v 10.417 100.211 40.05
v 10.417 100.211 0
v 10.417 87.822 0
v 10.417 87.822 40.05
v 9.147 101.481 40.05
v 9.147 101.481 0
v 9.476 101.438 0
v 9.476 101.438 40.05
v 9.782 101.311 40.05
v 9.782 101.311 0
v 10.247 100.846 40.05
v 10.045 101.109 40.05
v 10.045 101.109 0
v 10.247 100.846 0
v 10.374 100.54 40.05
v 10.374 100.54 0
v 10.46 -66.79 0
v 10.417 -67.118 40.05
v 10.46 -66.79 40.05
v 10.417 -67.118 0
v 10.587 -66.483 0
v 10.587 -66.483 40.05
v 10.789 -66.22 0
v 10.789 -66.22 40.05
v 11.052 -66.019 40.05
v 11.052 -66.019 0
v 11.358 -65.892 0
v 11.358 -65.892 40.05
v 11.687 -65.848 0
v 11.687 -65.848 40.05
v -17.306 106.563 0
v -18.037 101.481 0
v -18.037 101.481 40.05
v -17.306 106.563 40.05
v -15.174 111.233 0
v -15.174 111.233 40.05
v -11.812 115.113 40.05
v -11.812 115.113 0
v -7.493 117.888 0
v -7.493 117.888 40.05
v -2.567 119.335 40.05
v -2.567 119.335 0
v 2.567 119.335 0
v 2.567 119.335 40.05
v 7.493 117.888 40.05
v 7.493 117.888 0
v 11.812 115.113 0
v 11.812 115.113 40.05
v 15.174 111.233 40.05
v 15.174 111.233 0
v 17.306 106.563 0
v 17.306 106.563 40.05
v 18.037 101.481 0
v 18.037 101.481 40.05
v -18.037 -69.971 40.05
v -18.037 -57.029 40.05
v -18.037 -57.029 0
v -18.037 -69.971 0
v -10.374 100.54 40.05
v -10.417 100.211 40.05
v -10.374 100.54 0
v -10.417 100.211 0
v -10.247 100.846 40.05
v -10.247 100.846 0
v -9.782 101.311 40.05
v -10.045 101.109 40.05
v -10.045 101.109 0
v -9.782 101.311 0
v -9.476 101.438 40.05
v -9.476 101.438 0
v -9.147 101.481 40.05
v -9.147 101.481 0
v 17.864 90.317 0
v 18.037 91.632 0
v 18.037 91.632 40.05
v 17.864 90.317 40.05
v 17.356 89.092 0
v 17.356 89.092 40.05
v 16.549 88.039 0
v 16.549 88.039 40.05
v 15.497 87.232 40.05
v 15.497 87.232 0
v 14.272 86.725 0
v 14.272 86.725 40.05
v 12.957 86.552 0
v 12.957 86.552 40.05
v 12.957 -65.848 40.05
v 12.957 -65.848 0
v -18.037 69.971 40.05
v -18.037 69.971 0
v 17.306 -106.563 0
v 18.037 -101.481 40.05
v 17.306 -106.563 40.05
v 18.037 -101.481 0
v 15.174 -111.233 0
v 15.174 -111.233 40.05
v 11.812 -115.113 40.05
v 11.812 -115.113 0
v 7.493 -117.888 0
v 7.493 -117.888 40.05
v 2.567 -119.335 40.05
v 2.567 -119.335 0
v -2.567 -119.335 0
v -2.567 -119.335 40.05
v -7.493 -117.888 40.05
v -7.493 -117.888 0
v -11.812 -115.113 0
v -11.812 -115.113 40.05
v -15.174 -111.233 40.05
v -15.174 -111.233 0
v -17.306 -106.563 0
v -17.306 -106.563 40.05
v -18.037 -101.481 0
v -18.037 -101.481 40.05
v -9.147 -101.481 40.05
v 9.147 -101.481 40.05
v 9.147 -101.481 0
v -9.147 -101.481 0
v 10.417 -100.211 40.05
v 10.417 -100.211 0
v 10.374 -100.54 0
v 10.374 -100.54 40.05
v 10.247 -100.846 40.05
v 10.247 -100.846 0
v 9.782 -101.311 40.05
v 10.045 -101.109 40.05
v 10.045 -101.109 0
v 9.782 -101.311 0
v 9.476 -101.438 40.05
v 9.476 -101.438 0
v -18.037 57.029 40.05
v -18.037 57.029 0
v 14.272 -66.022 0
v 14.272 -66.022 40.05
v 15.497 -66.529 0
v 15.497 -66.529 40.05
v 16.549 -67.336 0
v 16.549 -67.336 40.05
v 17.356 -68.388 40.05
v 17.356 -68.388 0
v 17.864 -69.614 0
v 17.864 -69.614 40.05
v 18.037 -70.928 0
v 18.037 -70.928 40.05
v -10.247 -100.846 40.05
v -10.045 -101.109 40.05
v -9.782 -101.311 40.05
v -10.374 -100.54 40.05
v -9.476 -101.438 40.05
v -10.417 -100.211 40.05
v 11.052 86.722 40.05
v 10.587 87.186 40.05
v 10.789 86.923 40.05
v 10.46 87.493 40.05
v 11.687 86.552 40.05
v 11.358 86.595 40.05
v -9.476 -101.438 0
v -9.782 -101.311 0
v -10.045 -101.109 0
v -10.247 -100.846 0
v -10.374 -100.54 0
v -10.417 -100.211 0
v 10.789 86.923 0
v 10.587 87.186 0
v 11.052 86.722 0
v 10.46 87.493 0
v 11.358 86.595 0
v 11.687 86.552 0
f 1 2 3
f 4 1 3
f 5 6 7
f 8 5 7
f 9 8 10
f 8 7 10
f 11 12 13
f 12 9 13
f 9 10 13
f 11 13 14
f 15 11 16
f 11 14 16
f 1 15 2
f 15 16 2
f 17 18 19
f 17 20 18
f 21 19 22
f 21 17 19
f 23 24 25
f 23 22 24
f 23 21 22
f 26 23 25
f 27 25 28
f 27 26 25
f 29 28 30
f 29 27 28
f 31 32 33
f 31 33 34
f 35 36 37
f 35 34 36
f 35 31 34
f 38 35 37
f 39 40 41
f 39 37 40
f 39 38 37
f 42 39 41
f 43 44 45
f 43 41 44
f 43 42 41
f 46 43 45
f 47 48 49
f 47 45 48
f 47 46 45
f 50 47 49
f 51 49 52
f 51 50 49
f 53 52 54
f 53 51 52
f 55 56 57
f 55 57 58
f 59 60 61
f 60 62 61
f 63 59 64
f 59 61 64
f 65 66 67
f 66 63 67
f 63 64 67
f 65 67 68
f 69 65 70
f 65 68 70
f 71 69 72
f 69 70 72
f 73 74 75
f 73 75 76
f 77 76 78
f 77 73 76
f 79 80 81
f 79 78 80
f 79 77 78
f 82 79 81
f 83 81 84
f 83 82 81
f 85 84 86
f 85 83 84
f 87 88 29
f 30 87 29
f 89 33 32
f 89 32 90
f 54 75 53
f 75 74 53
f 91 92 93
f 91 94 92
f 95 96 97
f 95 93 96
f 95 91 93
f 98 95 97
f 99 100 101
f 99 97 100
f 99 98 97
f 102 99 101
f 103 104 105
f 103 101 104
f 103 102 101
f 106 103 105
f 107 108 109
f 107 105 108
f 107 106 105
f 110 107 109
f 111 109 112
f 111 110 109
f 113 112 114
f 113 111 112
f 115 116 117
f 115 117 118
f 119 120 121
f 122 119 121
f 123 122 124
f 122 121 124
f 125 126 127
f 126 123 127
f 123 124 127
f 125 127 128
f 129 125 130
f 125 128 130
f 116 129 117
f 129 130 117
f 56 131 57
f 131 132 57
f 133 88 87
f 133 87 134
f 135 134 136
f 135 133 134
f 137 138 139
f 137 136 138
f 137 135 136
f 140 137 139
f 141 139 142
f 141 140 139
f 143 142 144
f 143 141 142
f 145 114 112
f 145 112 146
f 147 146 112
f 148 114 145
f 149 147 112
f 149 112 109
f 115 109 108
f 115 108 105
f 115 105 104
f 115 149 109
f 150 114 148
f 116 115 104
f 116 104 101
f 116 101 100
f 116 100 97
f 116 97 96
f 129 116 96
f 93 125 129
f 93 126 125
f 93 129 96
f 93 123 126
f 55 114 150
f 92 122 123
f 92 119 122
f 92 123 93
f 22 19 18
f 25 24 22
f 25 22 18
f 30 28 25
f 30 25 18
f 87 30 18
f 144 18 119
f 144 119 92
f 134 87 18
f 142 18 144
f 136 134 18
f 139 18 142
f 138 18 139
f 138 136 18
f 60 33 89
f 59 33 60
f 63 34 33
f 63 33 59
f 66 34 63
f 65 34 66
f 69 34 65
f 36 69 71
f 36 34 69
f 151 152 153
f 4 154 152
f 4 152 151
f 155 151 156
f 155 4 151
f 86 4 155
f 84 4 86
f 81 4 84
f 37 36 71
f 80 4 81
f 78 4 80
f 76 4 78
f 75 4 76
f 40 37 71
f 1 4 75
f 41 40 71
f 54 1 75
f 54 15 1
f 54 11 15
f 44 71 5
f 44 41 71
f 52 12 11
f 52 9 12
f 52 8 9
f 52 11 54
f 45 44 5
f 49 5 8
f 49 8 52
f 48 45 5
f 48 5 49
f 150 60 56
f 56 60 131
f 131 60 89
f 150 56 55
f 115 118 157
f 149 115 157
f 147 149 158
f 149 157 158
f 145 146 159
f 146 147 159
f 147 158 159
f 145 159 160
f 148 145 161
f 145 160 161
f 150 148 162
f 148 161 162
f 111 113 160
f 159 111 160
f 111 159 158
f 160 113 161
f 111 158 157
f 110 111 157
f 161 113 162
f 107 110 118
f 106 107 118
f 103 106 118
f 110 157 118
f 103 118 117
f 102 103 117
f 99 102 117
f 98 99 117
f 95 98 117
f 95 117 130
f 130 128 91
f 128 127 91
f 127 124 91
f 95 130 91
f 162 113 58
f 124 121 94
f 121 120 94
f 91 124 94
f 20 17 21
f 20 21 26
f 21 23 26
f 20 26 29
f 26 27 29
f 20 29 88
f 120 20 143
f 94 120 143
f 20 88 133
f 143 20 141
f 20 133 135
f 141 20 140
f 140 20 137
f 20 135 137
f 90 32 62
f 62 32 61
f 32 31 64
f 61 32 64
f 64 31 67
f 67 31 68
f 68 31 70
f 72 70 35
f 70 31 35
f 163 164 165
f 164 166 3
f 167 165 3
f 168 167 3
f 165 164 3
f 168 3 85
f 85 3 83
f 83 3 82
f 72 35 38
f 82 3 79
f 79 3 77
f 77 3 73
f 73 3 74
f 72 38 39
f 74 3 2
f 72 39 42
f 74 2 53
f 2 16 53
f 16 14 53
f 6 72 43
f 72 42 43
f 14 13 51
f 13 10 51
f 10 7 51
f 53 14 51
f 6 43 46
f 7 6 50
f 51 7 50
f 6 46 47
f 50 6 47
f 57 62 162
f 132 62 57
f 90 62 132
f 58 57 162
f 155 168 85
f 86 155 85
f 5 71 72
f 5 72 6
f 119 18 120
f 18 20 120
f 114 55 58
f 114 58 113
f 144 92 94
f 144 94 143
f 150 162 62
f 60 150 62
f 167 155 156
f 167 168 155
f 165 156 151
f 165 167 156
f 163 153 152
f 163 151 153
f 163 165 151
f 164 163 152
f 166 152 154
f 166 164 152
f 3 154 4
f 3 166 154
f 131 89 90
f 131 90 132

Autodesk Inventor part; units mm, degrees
ref_plane "YZ Plane" through (0, 0, 0) normal (1, 0, 0) x (0, 1, 0)
ref_plane "XZ Plane" through (0, 0, 0) normal (0, 1, 0) x (-1, 0, 0)
ref_plane "XY Plane" through (0, 0, 0) normal (0, 0, 1) x (1, 0, 0)
ref_plane "Work Plane12" through (0, 0, 0) normal (0, 0, 1) x (1, 0, 0)
sketch "Sketch13" plane through (0, 0, 0) normal (0, 0, 1) x (1, 0, 0)
  line L0 (18.0369, 91.6315) -> (18.0369, 101.4813) projected
  arc A0 (12.9569, 86.5515) -> (18.0369, 91.6315) centre (12.9569, 91.6315) ccw projected
  arc A1 (10.4169, 87.8215) -> (11.6869, 86.5515) centre (11.6869, 87.8215) ccw projected
  line L1 (11.6869, 86.5515) -> (12.9569, 86.5515) projected
  line L2 (10.4169, 100.2113) -> (10.4169, 87.8215) projected
  arc A2 (18.0369, 101.4813) -> (-18.0369, 101.4813) centre (0, 101.4813) ccw projected
  arc A3 (10.4169, 100.2113) -> (9.1469, 101.4813) centre (9.1469, 100.2113) ccw projected
  line L3 (-9.1469, 101.4813) -> (9.1469, 101.4813) projected
  arc A4 (-9.1469, 101.4813) -> (-10.4169, 100.2113) centre (-9.1469, 100.2113) ccw projected
  line L4 (-10.4169, -100.2113) -> (-10.4169, 100.2113) projected
  line L5 (-18.0369, 101.4813) -> (-18.0369, 69.971) projected
  line L6 (-18.0369, 57.029) -> (-18.0369, -57.029) projected
  line L7 (-18.0369, -69.971) -> (-18.0369, -101.4813) projected
  arc A5 (-18.0369, -101.4813) -> (18.0369, -101.4813) centre (0, -101.4813) ccw projected
  line L8 (18.0369, -101.4813) -> (18.0369, -70.9285) projected
  arc A6 (18.0369, -70.9285) -> (12.9569, -65.8485) centre (12.9569, -70.9285) ccw projected
  line L9 (12.9569, -65.8485) -> (11.6869, -65.8485) projected
  arc A7 (11.6869, -65.8485) -> (10.4169, -67.1185) centre (11.6869, -67.1185) ccw projected
  line L10 (10.4169, -67.1185) -> (10.4169, -100.2113) projected
  arc A8 (9.1469, -101.4813) -> (10.4169, -100.2113) centre (9.1469, -100.2113) ccw projected
  line L11 (9.1469, -101.4813) -> (-9.1469, -101.4813) projected
  arc A9 (-10.4169, -100.2113) -> (-9.1469, -101.4813) centre (-9.1469, -100.2113) ccw projected
  line L12 (-18.0369, 69.971) -> (-18.0369, 57.029)
  line L13 (-18.0369, -57.029) -> (-18.0369, -69.971)
  line L14 (18.0369, 91.6315) -> (18.0369, -70.9285) construction
  point P0 (0, 0)
ref_plane "Work Plane4" through (-9.1469, 0, 0) normal (0, -1, 0) x (1, 0, 0)
sketch "Loft Sketch" plane through (-9.1469, 0, 0) normal (0, -1, 0) x (1, 0, 0)
  line L0 (27.1839, 65.45) -> (43.979, 160.7)
  line L1 (27.1839, 65.45) -> (27.1839, 40.05)
  point P0 (9.1469, 0)
  point P1 (27.1839, 0)
  point P2 (27.1839, 0)
  point P3 (27.1839, 0)
  dimension "d6" = 170
  dimension "d7" = 95.25
  dimension "d65" = 25.4
  dimension "d68" = 160.7
extrude "Extrusion6" add sketch "Sketch13" along normal up to surface (40.05 mm away)
sketch "Lower" plane through (0, 101.4813, 40.05) normal (0, 0, 1) x (1, 0, 0)
  line L0 (10.4169, -13.6598) -> (10.4169, -1.27) projected
  arc A0 (10.4169, -13.6598) -> (11.6869, -14.9298) centre (11.6869, -13.6598) ccw projected
  line L1 (12.9569, -14.9298) -> (11.6869, -14.9298) projected
  arc A1 (12.9569, -14.9298) -> (18.0369, -9.8498) centre (12.9569, -9.8498) ccw projected
  line L2 (18.0369, 0) -> (18.0369, -9.8498) projected
  arc A2 (18.0369, 0) -> (-18.0369, 0) centre (0, 0) ccw projected
  line L3 (-18.0369, -202.9627) -> (-18.0369, 0) projected
  arc A3 (-18.0369, -202.9627) -> (18.0369, -202.9627) centre (0, -202.9627) ccw projected
  line L4 (18.0369, -172.4098) -> (18.0369, -202.9627) projected
  arc A4 (18.0369, -172.4098) -> (12.9569, -167.3298) centre (12.9569, -172.4098) ccw projected
  line L5 (11.6869, -167.3298) -> (12.9569, -167.3298) projected
  arc A5 (11.6869, -167.3298) -> (10.4169, -168.5998) centre (11.6869, -168.5998) ccw projected
  line L6 (10.4169, -201.6927) -> (10.4169, -168.5998) projected
  arc A6 (9.1469, -202.9627) -> (10.4169, -201.6927) centre (9.1469, -201.6927) ccw projected
  line L7 (-9.1469, -202.9627) -> (9.1469, -202.9627) projected
  arc A7 (-10.4169, -201.6927) -> (-9.1469, -202.9627) centre (-9.1469, -201.6927) ccw projected
  line L8 (-10.4169, -1.27) -> (-10.4169, -201.6927) projected
  arc A8 (-9.1469, 0) -> (-10.4169, -1.27) centre (-9.1469, -1.27) ccw projected
  line L9 (9.1469, 0) -> (-9.1469, 0) projected
  arc A9 (10.4169, -1.27) -> (9.1469, 0) centre (9.1469, -1.27) ccw projected
  point P0 (0, -101.4813)
ref_plane "Mid Lof Plane" through (18.0369, 0, 65.45) normal (0, 0, 1) x (1, 0, 0)
sketch "Mid" plane through (18.0369, 0, 65.45) normal (0, 0, 1) x (1, 0, 0)
  line L0 (-7.62, 87.8215) -> (-7.62, 100.2113) projected
  arc A0 (-7.62, 87.8215) -> (-6.35, 86.5515) centre (-6.35, 87.8215) ccw projected
  line L1 (-5.08, 86.5515) -> (-6.35, 86.5515) projected
  arc A1 (-5.08, 86.5515) -> (0, 91.6315) centre (-5.08, 91.6315) ccw projected
  line L2 (0, 101.4813) -> (0, 91.6315) projected
  arc A2 (0, 101.4813) -> (-36.0739, 101.4813) centre (-18.0369, 101.4813) ccw projected
  line L3 (-36.0739, -101.4813) -> (-36.0739, 101.4813) projected
  arc A3 (-36.0739, -101.4813) -> (0, -101.4813) centre (-18.0369, -101.4813) ccw projected
  line L4 (0, -70.9285) -> (0, -101.4813) projected
  arc A4 (0, -70.9285) -> (-5.08, -65.8485) centre (-5.08, -70.9285) ccw projected
  line L5 (-6.35, -65.8485) -> (-5.08, -65.8485) projected
  arc A5 (-6.35, -65.8485) -> (-7.62, -67.1185) centre (-6.35, -67.1185) ccw projected
  line L6 (-7.62, -100.2113) -> (-7.62, -67.1185) projected
  arc A6 (-8.89, -101.4813) -> (-7.62, -100.2113) centre (-8.89, -100.2113) ccw projected
  line L7 (-27.1839, -101.4813) -> (-8.89, -101.4813) projected
  arc A7 (-28.4539, -100.2113) -> (-27.1839, -101.4813) centre (-27.1839, -100.2113) ccw projected
  line L8 (-28.4539, 100.2113) -> (-28.4539, -100.2113) projected
  arc A8 (-27.1839, 101.4813) -> (-28.4539, 100.2113) centre (-27.1839, 100.2113) ccw projected
  line L9 (-8.89, 101.4813) -> (-27.1839, 101.4813) projected
  arc A9 (-7.62, 100.2113) -> (-8.89, 101.4813) centre (-8.89, 100.2113) ccw projected
  point P0 (-18.0369, 0)
ref_plane "Work Plane5" through (34.8321, 0, 160.7) normal (0, 0, 1) x (1, 0, 0)
ref_plane "Work Plane7" through (0, 0, 0) normal (0, 0, 1) x (1, 0, 0)
sketch "Sketch6" plane through (34.8321, 0, 160.7) normal (0, 0, 1) x (1, 0, 0)
  line L0 (0, 92.3062) -> (0, 91.6315)
  line L1 (-62.0442, 92.3062) -> (-62.0442, 0)
  line L2 (-69.6642, 0) -> (-69.6642, 92.3062)
  line L3 (0, 91.6315) -> (0, 0) construction
  line L4 (-52.869, 0) -> (-45.249, 0) construction
  arc A0 (-34.8321, 119.5183) -> (-62.0442, 92.3062) centre (-34.8321, 92.3062) ccw
  arc A1 (-7.62, 92.3062) -> (-34.8321, 119.5183) centre (-34.8321, 92.3062) ccw
  line L5 (-7.62, 92.3062) -> (-7.62, 89.0915)
  arc A2 (-7.62, 89.0915) -> (-5.08, 86.5515) centre (-5.08, 89.0915) ccw
  line L6 (-5.08, 86.5515) -> (-5.08, 86.5515)
  arc A3 (-5.08, 86.5515) -> (0, 91.6315) centre (-5.08, 91.6315) ccw
  line L7 (-7.62, 90.6989) -> (0, 90.6989) construction
  line L8 (-69.6642, 0) -> (-62.0442, 0) construction
  arc A4 (0, 92.3062) -> (-69.6642, 92.3062) centre (-34.8321, 92.3062) ccw
  line L9 (0, 0) -> (-69.6642, 0) construction
  line L10 (0, -92.3062) -> (0, -70.9285)
  line L11 (-62.0442, -92.3062) -> (-62.0442, 0)
  line L12 (-69.6642, 0) -> (-69.6642, -92.3062)
  arc A5 (-62.0442, -92.3062) -> (-34.8321, -119.5183) centre (-34.8321, -92.3062) ccw
  arc A6 (-34.8321, -119.5183) -> (-7.62, -92.3062) centre (-34.8321, -92.3062) ccw
  line L13 (-7.62, -92.3062) -> (-7.62, -68.3885)
  arc A7 (-5.08, -65.8485) -> (-7.62, -68.3885) centre (-5.08, -68.3885) ccw
  line L14 (-5.08, -65.8485) -> (-5.08, -65.8485)
  arc A8 (0, -70.9285) -> (-5.08, -65.8485) centre (-5.08, -70.9285) ccw
  arc A9 (-69.6642, -92.3062) -> (0, -92.3062) centre (-34.8321, -92.3062) ccw
  arc A10 (-57.314, -56.6624) -> (-59.219, -57.7622) centre (-57.949, -57.7622) ccw construction
  line L15 (-59.219, -57.7622) -> (-59.219, -69.2378) construction
  arc A11 (-59.219, -69.2378) -> (-57.314, -70.3376) centre (-57.949, -69.2378) ccw construction
  line L16 (-57.314, -70.3376) -> (-54.774, -68.8712) construction
  arc A12 (-52.869, -69.971) -> (-54.774, -68.8712) centre (-54.139, -69.971) ccw construction
  line L17 (-52.869, -69.971) -> (-52.869, -101.4813) construction
  arc A13 (-52.869, -101.4813) -> (-16.7951, -101.4813) centre (-34.8321, -101.4813) ccw construction
  line L18 (-16.7951, -101.4813) -> (-16.7951, -70.9285) construction
  arc A14 (-16.7951, -70.9285) -> (-21.8751, -65.8485) centre (-21.8751, -70.9285) ccw construction
  line L19 (-21.8751, -65.8485) -> (-23.1451, -65.8485) construction
  arc A15 (-23.1451, -65.8485) -> (-24.4151, -67.1185) centre (-23.1451, -67.1185) ccw construction
  line L20 (-24.4151, -67.1185) -> (-24.4151, -100.2113) construction
  arc A16 (-25.6851, -101.4813) -> (-24.4151, -100.2113) centre (-25.6851, -100.2113) ccw construction
  line L21 (-25.6851, -101.4813) -> (-43.979, -101.4813) construction
  arc A17 (-45.249, -100.2113) -> (-43.979, -101.4813) centre (-43.979, -100.2113) ccw construction
  line L22 (-45.249, -100.2113) -> (-45.249, 100.2113) construction
  arc A18 (-43.979, 101.4813) -> (-45.249, 100.2113) centre (-43.979, 100.2113) ccw construction
  line L23 (-43.979, 101.4813) -> (-25.6851, 101.4813) construction
  arc A19 (-24.4151, 100.2113) -> (-25.6851, 101.4813) centre (-25.6851, 100.2113) ccw construction
  line L24 (-24.4151, 100.2113) -> (-24.4151, 87.8215) construction
  arc A20 (-24.4151, 87.8215) -> (-23.1451, 86.5515) centre (-23.1451, 87.8215) ccw construction
  line L25 (-23.1451, 86.5515) -> (-21.8751, 86.5515) construction
  arc A21 (-21.8751, 86.5515) -> (-16.7951, 91.6315) centre (-21.8751, 91.6315) ccw construction
  line L26 (-16.7951, 91.6315) -> (-16.7951, 101.4813) construction
  arc A22 (-16.7951, 101.4813) -> (-52.869, 101.4813) centre (-34.8321, 101.4813) ccw construction
  line L27 (-52.869, 101.4813) -> (-52.869, 69.971) construction
  arc A23 (-54.774, 68.8712) -> (-52.869, 69.971) centre (-54.139, 69.971) ccw construction
  line L28 (-54.774, 68.8712) -> (-57.314, 70.3376) construction
  arc A24 (-57.314, 70.3376) -> (-59.219, 69.2378) centre (-57.949, 69.2378) ccw construction
  line L29 (-59.219, 69.2378) -> (-59.219, 57.7622) construction
  arc A25 (-59.219, 57.7622) -> (-57.314, 56.6624) centre (-57.949, 57.7622) ccw construction
  line L30 (-57.314, 56.6624) -> (-54.774, 58.1288) construction
  arc A26 (-52.869, 57.029) -> (-54.774, 58.1288) centre (-54.139, 57.029) ccw construction
  line L31 (-52.869, 57.029) -> (-52.869, -57.029) construction
  arc A27 (-54.774, -58.1288) -> (-52.869, -57.029) centre (-54.139, -57.029) ccw construction
  line L32 (-54.774, -58.1288) -> (-57.314, -56.6624) construction
  line L33 (-42.4521, 102.7513) -> (-42.4521, 105.2913) construction
  arc A28 (-43.7221, 104.0213) -> (-42.4521, 105.2913) centre (-43.7221, 105.2913) ccw construction
  line L34 (-43.7221, 104.0213) -> (-47.5321, 104.0213) construction
  arc A29 (-48.8021, 105.2913) -> (-47.5321, 104.0213) centre (-47.5321, 105.2913) ccw construction
  line L35 (-48.8021, 105.2913) -> (-48.8021, 107.8313) construction
  arc A30 (-44.0396, 113.9797) -> (-48.8021, 107.8313) centre (-42.4521, 107.8313) ccw construction
  arc A31 (-42.4521, 112.75) -> (-44.0396, 113.9797) centre (-43.7221, 112.75) ccw construction
  line L36 (-42.4521, 112.75) -> (-42.4521, 109.1013) construction
  line L37 (-42.4521, 109.1013) -> (-27.2121, 109.1013) construction
  line L38 (-27.2121, 109.1013) -> (-27.2121, 112.75) construction
  arc A32 (-25.6246, 113.9797) -> (-27.2121, 112.75) centre (-25.9421, 112.75) ccw construction
  arc A33 (-20.8621, 107.8313) -> (-25.6246, 113.9797) centre (-27.2121, 107.8313) ccw construction
  line L39 (-20.8621, 107.8313) -> (-20.8621, 105.2913) construction
  arc A34 (-22.1321, 104.0213) -> (-20.8621, 105.2913) centre (-22.1321, 105.2913) ccw construction
  line L40 (-22.1321, 104.0213) -> (-25.9421, 104.0213) construction
  arc A35 (-27.2121, 105.2913) -> (-25.9421, 104.0213) centre (-25.9421, 105.2913) ccw construction
  line L41 (-27.2121, 105.2913) -> (-27.2121, 102.7513) construction
  line L42 (-27.2121, 102.7513) -> (-42.4521, 102.7513) construction
  line L43 (-27.2121, -109.1013) -> (-42.4521, -109.1013) construction
  line L44 (-42.4521, -109.1013) -> (-42.4521, -112.75) construction
  arc A36 (-44.0396, -113.9797) -> (-42.4521, -112.75) centre (-43.7221, -112.75) ccw construction
  arc A37 (-48.8021, -107.8313) -> (-44.0396, -113.9797) centre (-42.4521, -107.8313) ccw construction
  line L45 (-48.8021, -107.8313) -> (-48.8021, -105.2913) construction
  arc A38 (-47.5321, -104.0213) -> (-48.8021, -105.2913) centre (-47.5321, -105.2913) ccw construction
  line L46 (-47.5321, -104.0213) -> (-43.7221, -104.0213) construction
  arc A39 (-42.4521, -105.2913) -> (-43.7221, -104.0213) centre (-43.7221, -105.2913) ccw construction
  line L47 (-42.4521, -105.2913) -> (-42.4521, -102.7513) construction
  line L48 (-42.4521, -102.7513) -> (-27.2121, -102.7513) construction
  line L49 (-27.2121, -102.7513) -> (-27.2121, -105.2913) construction
  arc A40 (-25.9421, -104.0213) -> (-27.2121, -105.2913) centre (-25.9421, -105.2913) ccw construction
  line L50 (-25.9421, -104.0213) -> (-22.1321, -104.0213) construction
  arc A41 (-20.8621, -105.2913) -> (-22.1321, -104.0213) centre (-22.1321, -105.2913) ccw construction
  line L51 (-20.8621, -105.2913) -> (-20.8621, -107.8313) construction
  arc A42 (-25.6246, -113.9797) -> (-20.8621, -107.8313) centre (-27.2121, -107.8313) ccw construction
  arc A43 (-27.2121, -112.75) -> (-25.6246, -113.9797) centre (-25.9421, -112.75) ccw construction
  line L52 (-27.2121, -112.75) -> (-27.2121, -109.1013) construction
  line L53 (-24.4151, 94.0164) -> (-16.7951, 94.0164) construction
  line L54 (-45.249, 100.2113) -> (-52.869, 100.2113) construction
  line L55 (-62.0442, 92.3062) -> (-69.6642, 92.3062) construction
  line L56 (-57.949, -65.405) -> (-57.949, -61.595) projected
  arc A44 (-56.679, -60.325) -> (-57.949, -61.595) centre (-56.679, -61.595) ccw projected
  line L57 (-56.679, -60.325) -> (-55.409, -60.325) projected
  arc A45 (-54.139, -61.595) -> (-55.409, -60.325) centre (-55.409, -61.595) ccw projected
  line L58 (-54.139, -61.595) -> (-54.139, -65.405) projected
  arc A46 (-55.409, -66.675) -> (-54.139, -65.405) centre (-55.409, -65.405) ccw projected
  line L59 (-55.409, -66.675) -> (-56.679, -66.675) projected
  arc A47 (-57.949, -65.405) -> (-56.679, -66.675) centre (-56.679, -65.405) ccw projected
  line L60 (-57.949, 61.595) -> (-57.949, 65.405) projected
  arc A48 (-56.679, 66.675) -> (-57.949, 65.405) centre (-56.679, 65.405) ccw projected
  line L61 (-56.679, 66.675) -> (-55.409, 66.675) projected
  arc A49 (-54.139, 65.405) -> (-55.409, 66.675) centre (-55.409, 65.405) ccw projected
  line L62 (-54.139, 65.405) -> (-54.139, 61.595) projected
  arc A50 (-55.409, 60.325) -> (-54.139, 61.595) centre (-55.409, 61.595) ccw projected
  line L63 (-55.409, 60.325) -> (-56.679, 60.325) projected
  arc A51 (-57.949, 61.595) -> (-56.679, 60.325) centre (-56.679, 61.595) ccw projected
  point P0 (-34.8321, 0)
  point P1 (-34.8321, 127.1383)
  point P2 (-34.8321, -127.1383)
  dimension "d25" = 27.2121
  dimension "d26" = 27.2121
  dimension "d29" = 1.27
  dimension "d30" = 202.9627
  dimension "d31" = 9.1751
sketch "Sketch8" plane through (0, 101.4813, 0) normal (0, 0, -1) x (-1, 0, 0)
  arc A0 (19.9419, -170.3525) -> (18.0369, -171.4524) centre (19.3069, -171.4524) ccw projected
  line L0 (22.4819, -171.819) -> (19.9419, -170.3525) projected
  arc A1 (22.4819, -171.819) -> (24.3869, -170.7191) centre (23.1169, -170.7191) ccw projected
  line L1 (24.3869, -159.2435) -> (24.3869, -170.7191) projected
  arc A2 (24.3869, -159.2435) -> (22.4819, -158.1437) centre (23.1169, -159.2435) ccw projected
  line L2 (19.9419, -159.6102) -> (22.4819, -158.1437) projected
  arc A3 (18.0369, -158.5103) -> (19.9419, -159.6102) centre (19.3069, -158.5103) ccw projected
  line L3 (19.9419, -32.6102) -> (22.4819, -31.1437) projected
  arc A4 (18.0369, -31.5103) -> (19.9419, -32.6102) centre (19.3069, -31.5103) ccw projected
  arc A5 (24.3869, -32.2435) -> (22.4819, -31.1437) centre (23.1169, -32.2435) ccw projected
  line L4 (24.3869, -32.2435) -> (24.3869, -43.7191) projected
  arc A6 (19.9419, -43.3525) -> (18.0369, -44.4524) centre (19.3069, -44.4524) ccw projected
  line L5 (22.4819, -44.819) -> (19.9419, -43.3525) projected
  arc A7 (22.4819, -44.819) -> (24.3869, -43.7191) centre (23.1169, -43.7191) ccw projected
  line L6 (18.0369, -31.5103) -> (18.0369, -44.4524)
  line L7 (18.0369, 0) -> (18.0369, -202.9627) construction
  line L8 (18.0369, -171.4524) -> (18.0369, -158.5103)
  point P0 (0, -101.4813)
sketch "Sketch9" plane through (0, 101.4813, 0) normal (0, 0, -1) x (-1, 0, 0)
  line L0 (7.62, 7.62) -> (-7.62, 7.62) construction
  line L1 (7.62, 11.2687) -> (7.62, 7.62) construction
  arc A0 (9.2075, 12.4984) -> (7.62, 11.2687) centre (8.89, 11.2687) ccw construction
  arc A1 (13.97, 6.35) -> (9.2075, 12.4984) centre (7.62, 6.35) ccw construction
  line L2 (13.97, 3.81) -> (13.97, 6.35) construction
  arc A2 (12.7, 2.54) -> (13.97, 3.81) centre (12.7, 3.81) ccw construction
  line L3 (8.89, 2.54) -> (12.7, 2.54) construction
  line L4 (7.62, 1.27) -> (7.62, 3.81) construction
  line L5 (-7.62, 7.62) -> (-7.62, 11.2687) construction
  arc A3 (-7.62, 11.2687) -> (-9.2075, 12.4984) centre (-8.89, 11.2687) ccw construction
  arc A4 (-9.2075, 12.4984) -> (-13.97, 6.35) centre (-7.62, 6.35) ccw construction
  line L6 (-13.97, 6.35) -> (-13.97, 3.81) construction
  arc A5 (-13.97, 3.81) -> (-12.7, 2.54) centre (-12.7, 3.81) ccw construction
  line L7 (-12.7, 2.54) -> (-8.89, 2.54) construction
  line L8 (-7.62, 3.81) -> (-7.62, 1.27) construction
  line L9 (-7.62, 1.27) -> (7.62, 1.27) construction
  line L10 (-7.874, 2.286) -> (-12.7, 2.286)
  arc A6 (-14.224, 3.81) -> (-12.7, 2.286) centre (-12.7, 3.81) ccw
  line L11 (-14.224, 3.81) -> (-14.224, 6.35)
  arc A7 (-9.271, 12.7443) -> (-14.224, 6.35) centre (-7.62, 6.35) ccw
  arc A8 (-7.366, 11.2687) -> (-9.271, 12.7443) centre (-8.89, 11.2687) ccw
  line L12 (-7.366, 11.2687) -> (-7.366, 6.35)
  line L13 (7.366, 6.35) -> (7.366, 11.2687)
  arc A9 (9.271, 12.7443) -> (7.366, 11.2687) centre (8.89, 11.2687) ccw
  arc A10 (14.224, 6.35) -> (9.271, 12.7443) centre (7.62, 6.35) ccw
  line L14 (14.224, 6.35) -> (14.224, 3.81)
  arc A11 (12.7, 2.286) -> (14.224, 3.81) centre (12.7, 3.81) ccw
  line L15 (12.7, 2.286) -> (7.874, 2.286)
  line L16 (7.874, 2.286) -> (7.874, -0.254)
  line L17 (-7.874, -0.254) -> (-7.874, 2.286)
  line L18 (7.874, -0.254) -> (-7.874, -0.254)
  line L19 (9.1469, 0) -> (-9.1469, 0) construction
  line L20 (7.366, 6.35) -> (-7.366, 6.35)
  point P0 (0, -101.4813)
  dimension "d45" = 0.254
  dimension "d46" = 0.254
  dimension "d47" = 0.254
  dimension "d50" = 0.254
  dimension "d51" = 0.254
  dimension "d52" = 1.27
sketch "Sketch10" plane through (-7.366, 109.3553, 0) normal (-1, 0, 0) x (0, 0, 1)
  line L0 (-12.7, -1.016) -> (7.62, -1.524) construction
  line L1 (7.62, 1.016) -> (7.62, -1.524) construction
  line L2 (11.8332, -1.7226) -> (7.62, 1.016) construction
  line L3 (12.2002, -1.7226) -> (12.2002, -1.9766)
  line L4 (12.2002, -1.9766) -> (0, -1.9766)
  line L5 (0, -4.064) -> (0, -1.524) construction
  line L6 (12.2002, -1.7226) -> (7.42, 1.3845)
  line L7 (7.42, 1.3845) -> (7.42, -1.3189)
  line L8 (7.42, -1.3189) -> (0, 0.3094)
  line L9 (0, -1.9766) -> (0, 0.3094)
  point P0 (0, -109.3553)
  dimension "d53" = 0.254
  dimension "d57" = 0.2
  dimension "d58" = 2.286
  dimension "d59" = 0.2
sketch "Sketch11" plane through (0, 101.4813, 0) normal (0, 0, -1) x (-1, 0, 0)
  arc A0 (19.3069, -39.8863) -> (20.5769, -41.1563) centre (20.5769, -39.8863) ccw construction
  line L0 (19.3069, -39.8863) -> (19.3069, -36.0763) construction
  arc A1 (20.5769, -34.8063) -> (19.3069, -36.0763) centre (20.5769, -36.0763) ccw construction
  line L1 (20.5769, -34.8063) -> (21.8469, -34.8063) construction
  arc A2 (23.1169, -36.0763) -> (21.8469, -34.8063) centre (21.8469, -36.0763) ccw construction
  line L2 (23.1169, -36.0763) -> (23.1169, -39.8863) construction
  arc A3 (21.8469, -41.1563) -> (23.1169, -39.8863) centre (21.8469, -39.8863) ccw construction
  line L3 (21.8469, -41.1563) -> (20.5769, -41.1563) construction
  arc A4 (23.1169, -163.0763) -> (21.8469, -161.8063) centre (21.8469, -163.0763) ccw construction
  line L4 (23.1169, -163.0763) -> (23.1169, -166.8863) construction
  arc A5 (21.8469, -168.1563) -> (23.1169, -166.8863) centre (21.8469, -166.8863) ccw construction
  line L5 (21.8469, -168.1563) -> (20.5769, -168.1563) construction
  arc A6 (19.3069, -166.8863) -> (20.5769, -168.1563) centre (20.5769, -166.8863) ccw construction
  line L6 (19.3069, -166.8863) -> (19.3069, -163.0763) construction
  arc A7 (20.5769, -161.8063) -> (19.3069, -163.0763) centre (20.5769, -163.0763) ccw construction
  line L7 (20.5769, -161.8063) -> (21.8469, -161.8063) construction
  line L8 (19.1069, -36.0763) -> (19.1069, -39.8863)
  arc A8 (19.1069, -39.8863) -> (20.5769, -41.3563) centre (20.5769, -39.8863) ccw
  line L9 (20.5769, -41.3563) -> (21.8469, -41.3563)
  arc A9 (21.8469, -41.3563) -> (23.3169, -39.8863) centre (21.8469, -39.8863) ccw
  line L10 (23.3169, -39.8863) -> (23.3169, -36.0763)
  arc A10 (23.3169, -36.0763) -> (21.8469, -34.6063) centre (21.8469, -36.0763) ccw
  line L11 (21.8469, -34.6063) -> (20.5769, -34.6063)
  arc A11 (20.5769, -34.6063) -> (19.1069, -36.0763) centre (20.5769, -36.0763) ccw
  line L12 (19.1069, -163.0763) -> (19.1069, -166.8863)
  arc A12 (19.1069, -166.8863) -> (20.5769, -168.3563) centre (20.5769, -166.8863) ccw
  line L13 (20.5769, -168.3563) -> (21.8469, -168.3563)
  arc A13 (21.8469, -168.3563) -> (23.3169, -166.8863) centre (21.8469, -166.8863) ccw
  line L14 (23.3169, -166.8863) -> (23.3169, -163.0763)
  arc A14 (23.3169, -163.0763) -> (21.8469, -161.6063) centre (21.8469, -163.0763) ccw
  line L15 (21.8469, -161.6063) -> (20.5769, -161.6063)
  arc A15 (20.5769, -161.6063) -> (19.1069, -163.0763) centre (20.5769, -163.0763) ccw
  point P0 (0, -101.4813)
  dimension "d60" = 0.2
  dimension "d61" = 0.2
equation "\"d26\" = d25"
equation "\"d45\" = d50"
equation "\"d46\" = d50"
equation "\"d51\" = d50"
equation "\"d59\" = d57"
properties part number "Top Part"
